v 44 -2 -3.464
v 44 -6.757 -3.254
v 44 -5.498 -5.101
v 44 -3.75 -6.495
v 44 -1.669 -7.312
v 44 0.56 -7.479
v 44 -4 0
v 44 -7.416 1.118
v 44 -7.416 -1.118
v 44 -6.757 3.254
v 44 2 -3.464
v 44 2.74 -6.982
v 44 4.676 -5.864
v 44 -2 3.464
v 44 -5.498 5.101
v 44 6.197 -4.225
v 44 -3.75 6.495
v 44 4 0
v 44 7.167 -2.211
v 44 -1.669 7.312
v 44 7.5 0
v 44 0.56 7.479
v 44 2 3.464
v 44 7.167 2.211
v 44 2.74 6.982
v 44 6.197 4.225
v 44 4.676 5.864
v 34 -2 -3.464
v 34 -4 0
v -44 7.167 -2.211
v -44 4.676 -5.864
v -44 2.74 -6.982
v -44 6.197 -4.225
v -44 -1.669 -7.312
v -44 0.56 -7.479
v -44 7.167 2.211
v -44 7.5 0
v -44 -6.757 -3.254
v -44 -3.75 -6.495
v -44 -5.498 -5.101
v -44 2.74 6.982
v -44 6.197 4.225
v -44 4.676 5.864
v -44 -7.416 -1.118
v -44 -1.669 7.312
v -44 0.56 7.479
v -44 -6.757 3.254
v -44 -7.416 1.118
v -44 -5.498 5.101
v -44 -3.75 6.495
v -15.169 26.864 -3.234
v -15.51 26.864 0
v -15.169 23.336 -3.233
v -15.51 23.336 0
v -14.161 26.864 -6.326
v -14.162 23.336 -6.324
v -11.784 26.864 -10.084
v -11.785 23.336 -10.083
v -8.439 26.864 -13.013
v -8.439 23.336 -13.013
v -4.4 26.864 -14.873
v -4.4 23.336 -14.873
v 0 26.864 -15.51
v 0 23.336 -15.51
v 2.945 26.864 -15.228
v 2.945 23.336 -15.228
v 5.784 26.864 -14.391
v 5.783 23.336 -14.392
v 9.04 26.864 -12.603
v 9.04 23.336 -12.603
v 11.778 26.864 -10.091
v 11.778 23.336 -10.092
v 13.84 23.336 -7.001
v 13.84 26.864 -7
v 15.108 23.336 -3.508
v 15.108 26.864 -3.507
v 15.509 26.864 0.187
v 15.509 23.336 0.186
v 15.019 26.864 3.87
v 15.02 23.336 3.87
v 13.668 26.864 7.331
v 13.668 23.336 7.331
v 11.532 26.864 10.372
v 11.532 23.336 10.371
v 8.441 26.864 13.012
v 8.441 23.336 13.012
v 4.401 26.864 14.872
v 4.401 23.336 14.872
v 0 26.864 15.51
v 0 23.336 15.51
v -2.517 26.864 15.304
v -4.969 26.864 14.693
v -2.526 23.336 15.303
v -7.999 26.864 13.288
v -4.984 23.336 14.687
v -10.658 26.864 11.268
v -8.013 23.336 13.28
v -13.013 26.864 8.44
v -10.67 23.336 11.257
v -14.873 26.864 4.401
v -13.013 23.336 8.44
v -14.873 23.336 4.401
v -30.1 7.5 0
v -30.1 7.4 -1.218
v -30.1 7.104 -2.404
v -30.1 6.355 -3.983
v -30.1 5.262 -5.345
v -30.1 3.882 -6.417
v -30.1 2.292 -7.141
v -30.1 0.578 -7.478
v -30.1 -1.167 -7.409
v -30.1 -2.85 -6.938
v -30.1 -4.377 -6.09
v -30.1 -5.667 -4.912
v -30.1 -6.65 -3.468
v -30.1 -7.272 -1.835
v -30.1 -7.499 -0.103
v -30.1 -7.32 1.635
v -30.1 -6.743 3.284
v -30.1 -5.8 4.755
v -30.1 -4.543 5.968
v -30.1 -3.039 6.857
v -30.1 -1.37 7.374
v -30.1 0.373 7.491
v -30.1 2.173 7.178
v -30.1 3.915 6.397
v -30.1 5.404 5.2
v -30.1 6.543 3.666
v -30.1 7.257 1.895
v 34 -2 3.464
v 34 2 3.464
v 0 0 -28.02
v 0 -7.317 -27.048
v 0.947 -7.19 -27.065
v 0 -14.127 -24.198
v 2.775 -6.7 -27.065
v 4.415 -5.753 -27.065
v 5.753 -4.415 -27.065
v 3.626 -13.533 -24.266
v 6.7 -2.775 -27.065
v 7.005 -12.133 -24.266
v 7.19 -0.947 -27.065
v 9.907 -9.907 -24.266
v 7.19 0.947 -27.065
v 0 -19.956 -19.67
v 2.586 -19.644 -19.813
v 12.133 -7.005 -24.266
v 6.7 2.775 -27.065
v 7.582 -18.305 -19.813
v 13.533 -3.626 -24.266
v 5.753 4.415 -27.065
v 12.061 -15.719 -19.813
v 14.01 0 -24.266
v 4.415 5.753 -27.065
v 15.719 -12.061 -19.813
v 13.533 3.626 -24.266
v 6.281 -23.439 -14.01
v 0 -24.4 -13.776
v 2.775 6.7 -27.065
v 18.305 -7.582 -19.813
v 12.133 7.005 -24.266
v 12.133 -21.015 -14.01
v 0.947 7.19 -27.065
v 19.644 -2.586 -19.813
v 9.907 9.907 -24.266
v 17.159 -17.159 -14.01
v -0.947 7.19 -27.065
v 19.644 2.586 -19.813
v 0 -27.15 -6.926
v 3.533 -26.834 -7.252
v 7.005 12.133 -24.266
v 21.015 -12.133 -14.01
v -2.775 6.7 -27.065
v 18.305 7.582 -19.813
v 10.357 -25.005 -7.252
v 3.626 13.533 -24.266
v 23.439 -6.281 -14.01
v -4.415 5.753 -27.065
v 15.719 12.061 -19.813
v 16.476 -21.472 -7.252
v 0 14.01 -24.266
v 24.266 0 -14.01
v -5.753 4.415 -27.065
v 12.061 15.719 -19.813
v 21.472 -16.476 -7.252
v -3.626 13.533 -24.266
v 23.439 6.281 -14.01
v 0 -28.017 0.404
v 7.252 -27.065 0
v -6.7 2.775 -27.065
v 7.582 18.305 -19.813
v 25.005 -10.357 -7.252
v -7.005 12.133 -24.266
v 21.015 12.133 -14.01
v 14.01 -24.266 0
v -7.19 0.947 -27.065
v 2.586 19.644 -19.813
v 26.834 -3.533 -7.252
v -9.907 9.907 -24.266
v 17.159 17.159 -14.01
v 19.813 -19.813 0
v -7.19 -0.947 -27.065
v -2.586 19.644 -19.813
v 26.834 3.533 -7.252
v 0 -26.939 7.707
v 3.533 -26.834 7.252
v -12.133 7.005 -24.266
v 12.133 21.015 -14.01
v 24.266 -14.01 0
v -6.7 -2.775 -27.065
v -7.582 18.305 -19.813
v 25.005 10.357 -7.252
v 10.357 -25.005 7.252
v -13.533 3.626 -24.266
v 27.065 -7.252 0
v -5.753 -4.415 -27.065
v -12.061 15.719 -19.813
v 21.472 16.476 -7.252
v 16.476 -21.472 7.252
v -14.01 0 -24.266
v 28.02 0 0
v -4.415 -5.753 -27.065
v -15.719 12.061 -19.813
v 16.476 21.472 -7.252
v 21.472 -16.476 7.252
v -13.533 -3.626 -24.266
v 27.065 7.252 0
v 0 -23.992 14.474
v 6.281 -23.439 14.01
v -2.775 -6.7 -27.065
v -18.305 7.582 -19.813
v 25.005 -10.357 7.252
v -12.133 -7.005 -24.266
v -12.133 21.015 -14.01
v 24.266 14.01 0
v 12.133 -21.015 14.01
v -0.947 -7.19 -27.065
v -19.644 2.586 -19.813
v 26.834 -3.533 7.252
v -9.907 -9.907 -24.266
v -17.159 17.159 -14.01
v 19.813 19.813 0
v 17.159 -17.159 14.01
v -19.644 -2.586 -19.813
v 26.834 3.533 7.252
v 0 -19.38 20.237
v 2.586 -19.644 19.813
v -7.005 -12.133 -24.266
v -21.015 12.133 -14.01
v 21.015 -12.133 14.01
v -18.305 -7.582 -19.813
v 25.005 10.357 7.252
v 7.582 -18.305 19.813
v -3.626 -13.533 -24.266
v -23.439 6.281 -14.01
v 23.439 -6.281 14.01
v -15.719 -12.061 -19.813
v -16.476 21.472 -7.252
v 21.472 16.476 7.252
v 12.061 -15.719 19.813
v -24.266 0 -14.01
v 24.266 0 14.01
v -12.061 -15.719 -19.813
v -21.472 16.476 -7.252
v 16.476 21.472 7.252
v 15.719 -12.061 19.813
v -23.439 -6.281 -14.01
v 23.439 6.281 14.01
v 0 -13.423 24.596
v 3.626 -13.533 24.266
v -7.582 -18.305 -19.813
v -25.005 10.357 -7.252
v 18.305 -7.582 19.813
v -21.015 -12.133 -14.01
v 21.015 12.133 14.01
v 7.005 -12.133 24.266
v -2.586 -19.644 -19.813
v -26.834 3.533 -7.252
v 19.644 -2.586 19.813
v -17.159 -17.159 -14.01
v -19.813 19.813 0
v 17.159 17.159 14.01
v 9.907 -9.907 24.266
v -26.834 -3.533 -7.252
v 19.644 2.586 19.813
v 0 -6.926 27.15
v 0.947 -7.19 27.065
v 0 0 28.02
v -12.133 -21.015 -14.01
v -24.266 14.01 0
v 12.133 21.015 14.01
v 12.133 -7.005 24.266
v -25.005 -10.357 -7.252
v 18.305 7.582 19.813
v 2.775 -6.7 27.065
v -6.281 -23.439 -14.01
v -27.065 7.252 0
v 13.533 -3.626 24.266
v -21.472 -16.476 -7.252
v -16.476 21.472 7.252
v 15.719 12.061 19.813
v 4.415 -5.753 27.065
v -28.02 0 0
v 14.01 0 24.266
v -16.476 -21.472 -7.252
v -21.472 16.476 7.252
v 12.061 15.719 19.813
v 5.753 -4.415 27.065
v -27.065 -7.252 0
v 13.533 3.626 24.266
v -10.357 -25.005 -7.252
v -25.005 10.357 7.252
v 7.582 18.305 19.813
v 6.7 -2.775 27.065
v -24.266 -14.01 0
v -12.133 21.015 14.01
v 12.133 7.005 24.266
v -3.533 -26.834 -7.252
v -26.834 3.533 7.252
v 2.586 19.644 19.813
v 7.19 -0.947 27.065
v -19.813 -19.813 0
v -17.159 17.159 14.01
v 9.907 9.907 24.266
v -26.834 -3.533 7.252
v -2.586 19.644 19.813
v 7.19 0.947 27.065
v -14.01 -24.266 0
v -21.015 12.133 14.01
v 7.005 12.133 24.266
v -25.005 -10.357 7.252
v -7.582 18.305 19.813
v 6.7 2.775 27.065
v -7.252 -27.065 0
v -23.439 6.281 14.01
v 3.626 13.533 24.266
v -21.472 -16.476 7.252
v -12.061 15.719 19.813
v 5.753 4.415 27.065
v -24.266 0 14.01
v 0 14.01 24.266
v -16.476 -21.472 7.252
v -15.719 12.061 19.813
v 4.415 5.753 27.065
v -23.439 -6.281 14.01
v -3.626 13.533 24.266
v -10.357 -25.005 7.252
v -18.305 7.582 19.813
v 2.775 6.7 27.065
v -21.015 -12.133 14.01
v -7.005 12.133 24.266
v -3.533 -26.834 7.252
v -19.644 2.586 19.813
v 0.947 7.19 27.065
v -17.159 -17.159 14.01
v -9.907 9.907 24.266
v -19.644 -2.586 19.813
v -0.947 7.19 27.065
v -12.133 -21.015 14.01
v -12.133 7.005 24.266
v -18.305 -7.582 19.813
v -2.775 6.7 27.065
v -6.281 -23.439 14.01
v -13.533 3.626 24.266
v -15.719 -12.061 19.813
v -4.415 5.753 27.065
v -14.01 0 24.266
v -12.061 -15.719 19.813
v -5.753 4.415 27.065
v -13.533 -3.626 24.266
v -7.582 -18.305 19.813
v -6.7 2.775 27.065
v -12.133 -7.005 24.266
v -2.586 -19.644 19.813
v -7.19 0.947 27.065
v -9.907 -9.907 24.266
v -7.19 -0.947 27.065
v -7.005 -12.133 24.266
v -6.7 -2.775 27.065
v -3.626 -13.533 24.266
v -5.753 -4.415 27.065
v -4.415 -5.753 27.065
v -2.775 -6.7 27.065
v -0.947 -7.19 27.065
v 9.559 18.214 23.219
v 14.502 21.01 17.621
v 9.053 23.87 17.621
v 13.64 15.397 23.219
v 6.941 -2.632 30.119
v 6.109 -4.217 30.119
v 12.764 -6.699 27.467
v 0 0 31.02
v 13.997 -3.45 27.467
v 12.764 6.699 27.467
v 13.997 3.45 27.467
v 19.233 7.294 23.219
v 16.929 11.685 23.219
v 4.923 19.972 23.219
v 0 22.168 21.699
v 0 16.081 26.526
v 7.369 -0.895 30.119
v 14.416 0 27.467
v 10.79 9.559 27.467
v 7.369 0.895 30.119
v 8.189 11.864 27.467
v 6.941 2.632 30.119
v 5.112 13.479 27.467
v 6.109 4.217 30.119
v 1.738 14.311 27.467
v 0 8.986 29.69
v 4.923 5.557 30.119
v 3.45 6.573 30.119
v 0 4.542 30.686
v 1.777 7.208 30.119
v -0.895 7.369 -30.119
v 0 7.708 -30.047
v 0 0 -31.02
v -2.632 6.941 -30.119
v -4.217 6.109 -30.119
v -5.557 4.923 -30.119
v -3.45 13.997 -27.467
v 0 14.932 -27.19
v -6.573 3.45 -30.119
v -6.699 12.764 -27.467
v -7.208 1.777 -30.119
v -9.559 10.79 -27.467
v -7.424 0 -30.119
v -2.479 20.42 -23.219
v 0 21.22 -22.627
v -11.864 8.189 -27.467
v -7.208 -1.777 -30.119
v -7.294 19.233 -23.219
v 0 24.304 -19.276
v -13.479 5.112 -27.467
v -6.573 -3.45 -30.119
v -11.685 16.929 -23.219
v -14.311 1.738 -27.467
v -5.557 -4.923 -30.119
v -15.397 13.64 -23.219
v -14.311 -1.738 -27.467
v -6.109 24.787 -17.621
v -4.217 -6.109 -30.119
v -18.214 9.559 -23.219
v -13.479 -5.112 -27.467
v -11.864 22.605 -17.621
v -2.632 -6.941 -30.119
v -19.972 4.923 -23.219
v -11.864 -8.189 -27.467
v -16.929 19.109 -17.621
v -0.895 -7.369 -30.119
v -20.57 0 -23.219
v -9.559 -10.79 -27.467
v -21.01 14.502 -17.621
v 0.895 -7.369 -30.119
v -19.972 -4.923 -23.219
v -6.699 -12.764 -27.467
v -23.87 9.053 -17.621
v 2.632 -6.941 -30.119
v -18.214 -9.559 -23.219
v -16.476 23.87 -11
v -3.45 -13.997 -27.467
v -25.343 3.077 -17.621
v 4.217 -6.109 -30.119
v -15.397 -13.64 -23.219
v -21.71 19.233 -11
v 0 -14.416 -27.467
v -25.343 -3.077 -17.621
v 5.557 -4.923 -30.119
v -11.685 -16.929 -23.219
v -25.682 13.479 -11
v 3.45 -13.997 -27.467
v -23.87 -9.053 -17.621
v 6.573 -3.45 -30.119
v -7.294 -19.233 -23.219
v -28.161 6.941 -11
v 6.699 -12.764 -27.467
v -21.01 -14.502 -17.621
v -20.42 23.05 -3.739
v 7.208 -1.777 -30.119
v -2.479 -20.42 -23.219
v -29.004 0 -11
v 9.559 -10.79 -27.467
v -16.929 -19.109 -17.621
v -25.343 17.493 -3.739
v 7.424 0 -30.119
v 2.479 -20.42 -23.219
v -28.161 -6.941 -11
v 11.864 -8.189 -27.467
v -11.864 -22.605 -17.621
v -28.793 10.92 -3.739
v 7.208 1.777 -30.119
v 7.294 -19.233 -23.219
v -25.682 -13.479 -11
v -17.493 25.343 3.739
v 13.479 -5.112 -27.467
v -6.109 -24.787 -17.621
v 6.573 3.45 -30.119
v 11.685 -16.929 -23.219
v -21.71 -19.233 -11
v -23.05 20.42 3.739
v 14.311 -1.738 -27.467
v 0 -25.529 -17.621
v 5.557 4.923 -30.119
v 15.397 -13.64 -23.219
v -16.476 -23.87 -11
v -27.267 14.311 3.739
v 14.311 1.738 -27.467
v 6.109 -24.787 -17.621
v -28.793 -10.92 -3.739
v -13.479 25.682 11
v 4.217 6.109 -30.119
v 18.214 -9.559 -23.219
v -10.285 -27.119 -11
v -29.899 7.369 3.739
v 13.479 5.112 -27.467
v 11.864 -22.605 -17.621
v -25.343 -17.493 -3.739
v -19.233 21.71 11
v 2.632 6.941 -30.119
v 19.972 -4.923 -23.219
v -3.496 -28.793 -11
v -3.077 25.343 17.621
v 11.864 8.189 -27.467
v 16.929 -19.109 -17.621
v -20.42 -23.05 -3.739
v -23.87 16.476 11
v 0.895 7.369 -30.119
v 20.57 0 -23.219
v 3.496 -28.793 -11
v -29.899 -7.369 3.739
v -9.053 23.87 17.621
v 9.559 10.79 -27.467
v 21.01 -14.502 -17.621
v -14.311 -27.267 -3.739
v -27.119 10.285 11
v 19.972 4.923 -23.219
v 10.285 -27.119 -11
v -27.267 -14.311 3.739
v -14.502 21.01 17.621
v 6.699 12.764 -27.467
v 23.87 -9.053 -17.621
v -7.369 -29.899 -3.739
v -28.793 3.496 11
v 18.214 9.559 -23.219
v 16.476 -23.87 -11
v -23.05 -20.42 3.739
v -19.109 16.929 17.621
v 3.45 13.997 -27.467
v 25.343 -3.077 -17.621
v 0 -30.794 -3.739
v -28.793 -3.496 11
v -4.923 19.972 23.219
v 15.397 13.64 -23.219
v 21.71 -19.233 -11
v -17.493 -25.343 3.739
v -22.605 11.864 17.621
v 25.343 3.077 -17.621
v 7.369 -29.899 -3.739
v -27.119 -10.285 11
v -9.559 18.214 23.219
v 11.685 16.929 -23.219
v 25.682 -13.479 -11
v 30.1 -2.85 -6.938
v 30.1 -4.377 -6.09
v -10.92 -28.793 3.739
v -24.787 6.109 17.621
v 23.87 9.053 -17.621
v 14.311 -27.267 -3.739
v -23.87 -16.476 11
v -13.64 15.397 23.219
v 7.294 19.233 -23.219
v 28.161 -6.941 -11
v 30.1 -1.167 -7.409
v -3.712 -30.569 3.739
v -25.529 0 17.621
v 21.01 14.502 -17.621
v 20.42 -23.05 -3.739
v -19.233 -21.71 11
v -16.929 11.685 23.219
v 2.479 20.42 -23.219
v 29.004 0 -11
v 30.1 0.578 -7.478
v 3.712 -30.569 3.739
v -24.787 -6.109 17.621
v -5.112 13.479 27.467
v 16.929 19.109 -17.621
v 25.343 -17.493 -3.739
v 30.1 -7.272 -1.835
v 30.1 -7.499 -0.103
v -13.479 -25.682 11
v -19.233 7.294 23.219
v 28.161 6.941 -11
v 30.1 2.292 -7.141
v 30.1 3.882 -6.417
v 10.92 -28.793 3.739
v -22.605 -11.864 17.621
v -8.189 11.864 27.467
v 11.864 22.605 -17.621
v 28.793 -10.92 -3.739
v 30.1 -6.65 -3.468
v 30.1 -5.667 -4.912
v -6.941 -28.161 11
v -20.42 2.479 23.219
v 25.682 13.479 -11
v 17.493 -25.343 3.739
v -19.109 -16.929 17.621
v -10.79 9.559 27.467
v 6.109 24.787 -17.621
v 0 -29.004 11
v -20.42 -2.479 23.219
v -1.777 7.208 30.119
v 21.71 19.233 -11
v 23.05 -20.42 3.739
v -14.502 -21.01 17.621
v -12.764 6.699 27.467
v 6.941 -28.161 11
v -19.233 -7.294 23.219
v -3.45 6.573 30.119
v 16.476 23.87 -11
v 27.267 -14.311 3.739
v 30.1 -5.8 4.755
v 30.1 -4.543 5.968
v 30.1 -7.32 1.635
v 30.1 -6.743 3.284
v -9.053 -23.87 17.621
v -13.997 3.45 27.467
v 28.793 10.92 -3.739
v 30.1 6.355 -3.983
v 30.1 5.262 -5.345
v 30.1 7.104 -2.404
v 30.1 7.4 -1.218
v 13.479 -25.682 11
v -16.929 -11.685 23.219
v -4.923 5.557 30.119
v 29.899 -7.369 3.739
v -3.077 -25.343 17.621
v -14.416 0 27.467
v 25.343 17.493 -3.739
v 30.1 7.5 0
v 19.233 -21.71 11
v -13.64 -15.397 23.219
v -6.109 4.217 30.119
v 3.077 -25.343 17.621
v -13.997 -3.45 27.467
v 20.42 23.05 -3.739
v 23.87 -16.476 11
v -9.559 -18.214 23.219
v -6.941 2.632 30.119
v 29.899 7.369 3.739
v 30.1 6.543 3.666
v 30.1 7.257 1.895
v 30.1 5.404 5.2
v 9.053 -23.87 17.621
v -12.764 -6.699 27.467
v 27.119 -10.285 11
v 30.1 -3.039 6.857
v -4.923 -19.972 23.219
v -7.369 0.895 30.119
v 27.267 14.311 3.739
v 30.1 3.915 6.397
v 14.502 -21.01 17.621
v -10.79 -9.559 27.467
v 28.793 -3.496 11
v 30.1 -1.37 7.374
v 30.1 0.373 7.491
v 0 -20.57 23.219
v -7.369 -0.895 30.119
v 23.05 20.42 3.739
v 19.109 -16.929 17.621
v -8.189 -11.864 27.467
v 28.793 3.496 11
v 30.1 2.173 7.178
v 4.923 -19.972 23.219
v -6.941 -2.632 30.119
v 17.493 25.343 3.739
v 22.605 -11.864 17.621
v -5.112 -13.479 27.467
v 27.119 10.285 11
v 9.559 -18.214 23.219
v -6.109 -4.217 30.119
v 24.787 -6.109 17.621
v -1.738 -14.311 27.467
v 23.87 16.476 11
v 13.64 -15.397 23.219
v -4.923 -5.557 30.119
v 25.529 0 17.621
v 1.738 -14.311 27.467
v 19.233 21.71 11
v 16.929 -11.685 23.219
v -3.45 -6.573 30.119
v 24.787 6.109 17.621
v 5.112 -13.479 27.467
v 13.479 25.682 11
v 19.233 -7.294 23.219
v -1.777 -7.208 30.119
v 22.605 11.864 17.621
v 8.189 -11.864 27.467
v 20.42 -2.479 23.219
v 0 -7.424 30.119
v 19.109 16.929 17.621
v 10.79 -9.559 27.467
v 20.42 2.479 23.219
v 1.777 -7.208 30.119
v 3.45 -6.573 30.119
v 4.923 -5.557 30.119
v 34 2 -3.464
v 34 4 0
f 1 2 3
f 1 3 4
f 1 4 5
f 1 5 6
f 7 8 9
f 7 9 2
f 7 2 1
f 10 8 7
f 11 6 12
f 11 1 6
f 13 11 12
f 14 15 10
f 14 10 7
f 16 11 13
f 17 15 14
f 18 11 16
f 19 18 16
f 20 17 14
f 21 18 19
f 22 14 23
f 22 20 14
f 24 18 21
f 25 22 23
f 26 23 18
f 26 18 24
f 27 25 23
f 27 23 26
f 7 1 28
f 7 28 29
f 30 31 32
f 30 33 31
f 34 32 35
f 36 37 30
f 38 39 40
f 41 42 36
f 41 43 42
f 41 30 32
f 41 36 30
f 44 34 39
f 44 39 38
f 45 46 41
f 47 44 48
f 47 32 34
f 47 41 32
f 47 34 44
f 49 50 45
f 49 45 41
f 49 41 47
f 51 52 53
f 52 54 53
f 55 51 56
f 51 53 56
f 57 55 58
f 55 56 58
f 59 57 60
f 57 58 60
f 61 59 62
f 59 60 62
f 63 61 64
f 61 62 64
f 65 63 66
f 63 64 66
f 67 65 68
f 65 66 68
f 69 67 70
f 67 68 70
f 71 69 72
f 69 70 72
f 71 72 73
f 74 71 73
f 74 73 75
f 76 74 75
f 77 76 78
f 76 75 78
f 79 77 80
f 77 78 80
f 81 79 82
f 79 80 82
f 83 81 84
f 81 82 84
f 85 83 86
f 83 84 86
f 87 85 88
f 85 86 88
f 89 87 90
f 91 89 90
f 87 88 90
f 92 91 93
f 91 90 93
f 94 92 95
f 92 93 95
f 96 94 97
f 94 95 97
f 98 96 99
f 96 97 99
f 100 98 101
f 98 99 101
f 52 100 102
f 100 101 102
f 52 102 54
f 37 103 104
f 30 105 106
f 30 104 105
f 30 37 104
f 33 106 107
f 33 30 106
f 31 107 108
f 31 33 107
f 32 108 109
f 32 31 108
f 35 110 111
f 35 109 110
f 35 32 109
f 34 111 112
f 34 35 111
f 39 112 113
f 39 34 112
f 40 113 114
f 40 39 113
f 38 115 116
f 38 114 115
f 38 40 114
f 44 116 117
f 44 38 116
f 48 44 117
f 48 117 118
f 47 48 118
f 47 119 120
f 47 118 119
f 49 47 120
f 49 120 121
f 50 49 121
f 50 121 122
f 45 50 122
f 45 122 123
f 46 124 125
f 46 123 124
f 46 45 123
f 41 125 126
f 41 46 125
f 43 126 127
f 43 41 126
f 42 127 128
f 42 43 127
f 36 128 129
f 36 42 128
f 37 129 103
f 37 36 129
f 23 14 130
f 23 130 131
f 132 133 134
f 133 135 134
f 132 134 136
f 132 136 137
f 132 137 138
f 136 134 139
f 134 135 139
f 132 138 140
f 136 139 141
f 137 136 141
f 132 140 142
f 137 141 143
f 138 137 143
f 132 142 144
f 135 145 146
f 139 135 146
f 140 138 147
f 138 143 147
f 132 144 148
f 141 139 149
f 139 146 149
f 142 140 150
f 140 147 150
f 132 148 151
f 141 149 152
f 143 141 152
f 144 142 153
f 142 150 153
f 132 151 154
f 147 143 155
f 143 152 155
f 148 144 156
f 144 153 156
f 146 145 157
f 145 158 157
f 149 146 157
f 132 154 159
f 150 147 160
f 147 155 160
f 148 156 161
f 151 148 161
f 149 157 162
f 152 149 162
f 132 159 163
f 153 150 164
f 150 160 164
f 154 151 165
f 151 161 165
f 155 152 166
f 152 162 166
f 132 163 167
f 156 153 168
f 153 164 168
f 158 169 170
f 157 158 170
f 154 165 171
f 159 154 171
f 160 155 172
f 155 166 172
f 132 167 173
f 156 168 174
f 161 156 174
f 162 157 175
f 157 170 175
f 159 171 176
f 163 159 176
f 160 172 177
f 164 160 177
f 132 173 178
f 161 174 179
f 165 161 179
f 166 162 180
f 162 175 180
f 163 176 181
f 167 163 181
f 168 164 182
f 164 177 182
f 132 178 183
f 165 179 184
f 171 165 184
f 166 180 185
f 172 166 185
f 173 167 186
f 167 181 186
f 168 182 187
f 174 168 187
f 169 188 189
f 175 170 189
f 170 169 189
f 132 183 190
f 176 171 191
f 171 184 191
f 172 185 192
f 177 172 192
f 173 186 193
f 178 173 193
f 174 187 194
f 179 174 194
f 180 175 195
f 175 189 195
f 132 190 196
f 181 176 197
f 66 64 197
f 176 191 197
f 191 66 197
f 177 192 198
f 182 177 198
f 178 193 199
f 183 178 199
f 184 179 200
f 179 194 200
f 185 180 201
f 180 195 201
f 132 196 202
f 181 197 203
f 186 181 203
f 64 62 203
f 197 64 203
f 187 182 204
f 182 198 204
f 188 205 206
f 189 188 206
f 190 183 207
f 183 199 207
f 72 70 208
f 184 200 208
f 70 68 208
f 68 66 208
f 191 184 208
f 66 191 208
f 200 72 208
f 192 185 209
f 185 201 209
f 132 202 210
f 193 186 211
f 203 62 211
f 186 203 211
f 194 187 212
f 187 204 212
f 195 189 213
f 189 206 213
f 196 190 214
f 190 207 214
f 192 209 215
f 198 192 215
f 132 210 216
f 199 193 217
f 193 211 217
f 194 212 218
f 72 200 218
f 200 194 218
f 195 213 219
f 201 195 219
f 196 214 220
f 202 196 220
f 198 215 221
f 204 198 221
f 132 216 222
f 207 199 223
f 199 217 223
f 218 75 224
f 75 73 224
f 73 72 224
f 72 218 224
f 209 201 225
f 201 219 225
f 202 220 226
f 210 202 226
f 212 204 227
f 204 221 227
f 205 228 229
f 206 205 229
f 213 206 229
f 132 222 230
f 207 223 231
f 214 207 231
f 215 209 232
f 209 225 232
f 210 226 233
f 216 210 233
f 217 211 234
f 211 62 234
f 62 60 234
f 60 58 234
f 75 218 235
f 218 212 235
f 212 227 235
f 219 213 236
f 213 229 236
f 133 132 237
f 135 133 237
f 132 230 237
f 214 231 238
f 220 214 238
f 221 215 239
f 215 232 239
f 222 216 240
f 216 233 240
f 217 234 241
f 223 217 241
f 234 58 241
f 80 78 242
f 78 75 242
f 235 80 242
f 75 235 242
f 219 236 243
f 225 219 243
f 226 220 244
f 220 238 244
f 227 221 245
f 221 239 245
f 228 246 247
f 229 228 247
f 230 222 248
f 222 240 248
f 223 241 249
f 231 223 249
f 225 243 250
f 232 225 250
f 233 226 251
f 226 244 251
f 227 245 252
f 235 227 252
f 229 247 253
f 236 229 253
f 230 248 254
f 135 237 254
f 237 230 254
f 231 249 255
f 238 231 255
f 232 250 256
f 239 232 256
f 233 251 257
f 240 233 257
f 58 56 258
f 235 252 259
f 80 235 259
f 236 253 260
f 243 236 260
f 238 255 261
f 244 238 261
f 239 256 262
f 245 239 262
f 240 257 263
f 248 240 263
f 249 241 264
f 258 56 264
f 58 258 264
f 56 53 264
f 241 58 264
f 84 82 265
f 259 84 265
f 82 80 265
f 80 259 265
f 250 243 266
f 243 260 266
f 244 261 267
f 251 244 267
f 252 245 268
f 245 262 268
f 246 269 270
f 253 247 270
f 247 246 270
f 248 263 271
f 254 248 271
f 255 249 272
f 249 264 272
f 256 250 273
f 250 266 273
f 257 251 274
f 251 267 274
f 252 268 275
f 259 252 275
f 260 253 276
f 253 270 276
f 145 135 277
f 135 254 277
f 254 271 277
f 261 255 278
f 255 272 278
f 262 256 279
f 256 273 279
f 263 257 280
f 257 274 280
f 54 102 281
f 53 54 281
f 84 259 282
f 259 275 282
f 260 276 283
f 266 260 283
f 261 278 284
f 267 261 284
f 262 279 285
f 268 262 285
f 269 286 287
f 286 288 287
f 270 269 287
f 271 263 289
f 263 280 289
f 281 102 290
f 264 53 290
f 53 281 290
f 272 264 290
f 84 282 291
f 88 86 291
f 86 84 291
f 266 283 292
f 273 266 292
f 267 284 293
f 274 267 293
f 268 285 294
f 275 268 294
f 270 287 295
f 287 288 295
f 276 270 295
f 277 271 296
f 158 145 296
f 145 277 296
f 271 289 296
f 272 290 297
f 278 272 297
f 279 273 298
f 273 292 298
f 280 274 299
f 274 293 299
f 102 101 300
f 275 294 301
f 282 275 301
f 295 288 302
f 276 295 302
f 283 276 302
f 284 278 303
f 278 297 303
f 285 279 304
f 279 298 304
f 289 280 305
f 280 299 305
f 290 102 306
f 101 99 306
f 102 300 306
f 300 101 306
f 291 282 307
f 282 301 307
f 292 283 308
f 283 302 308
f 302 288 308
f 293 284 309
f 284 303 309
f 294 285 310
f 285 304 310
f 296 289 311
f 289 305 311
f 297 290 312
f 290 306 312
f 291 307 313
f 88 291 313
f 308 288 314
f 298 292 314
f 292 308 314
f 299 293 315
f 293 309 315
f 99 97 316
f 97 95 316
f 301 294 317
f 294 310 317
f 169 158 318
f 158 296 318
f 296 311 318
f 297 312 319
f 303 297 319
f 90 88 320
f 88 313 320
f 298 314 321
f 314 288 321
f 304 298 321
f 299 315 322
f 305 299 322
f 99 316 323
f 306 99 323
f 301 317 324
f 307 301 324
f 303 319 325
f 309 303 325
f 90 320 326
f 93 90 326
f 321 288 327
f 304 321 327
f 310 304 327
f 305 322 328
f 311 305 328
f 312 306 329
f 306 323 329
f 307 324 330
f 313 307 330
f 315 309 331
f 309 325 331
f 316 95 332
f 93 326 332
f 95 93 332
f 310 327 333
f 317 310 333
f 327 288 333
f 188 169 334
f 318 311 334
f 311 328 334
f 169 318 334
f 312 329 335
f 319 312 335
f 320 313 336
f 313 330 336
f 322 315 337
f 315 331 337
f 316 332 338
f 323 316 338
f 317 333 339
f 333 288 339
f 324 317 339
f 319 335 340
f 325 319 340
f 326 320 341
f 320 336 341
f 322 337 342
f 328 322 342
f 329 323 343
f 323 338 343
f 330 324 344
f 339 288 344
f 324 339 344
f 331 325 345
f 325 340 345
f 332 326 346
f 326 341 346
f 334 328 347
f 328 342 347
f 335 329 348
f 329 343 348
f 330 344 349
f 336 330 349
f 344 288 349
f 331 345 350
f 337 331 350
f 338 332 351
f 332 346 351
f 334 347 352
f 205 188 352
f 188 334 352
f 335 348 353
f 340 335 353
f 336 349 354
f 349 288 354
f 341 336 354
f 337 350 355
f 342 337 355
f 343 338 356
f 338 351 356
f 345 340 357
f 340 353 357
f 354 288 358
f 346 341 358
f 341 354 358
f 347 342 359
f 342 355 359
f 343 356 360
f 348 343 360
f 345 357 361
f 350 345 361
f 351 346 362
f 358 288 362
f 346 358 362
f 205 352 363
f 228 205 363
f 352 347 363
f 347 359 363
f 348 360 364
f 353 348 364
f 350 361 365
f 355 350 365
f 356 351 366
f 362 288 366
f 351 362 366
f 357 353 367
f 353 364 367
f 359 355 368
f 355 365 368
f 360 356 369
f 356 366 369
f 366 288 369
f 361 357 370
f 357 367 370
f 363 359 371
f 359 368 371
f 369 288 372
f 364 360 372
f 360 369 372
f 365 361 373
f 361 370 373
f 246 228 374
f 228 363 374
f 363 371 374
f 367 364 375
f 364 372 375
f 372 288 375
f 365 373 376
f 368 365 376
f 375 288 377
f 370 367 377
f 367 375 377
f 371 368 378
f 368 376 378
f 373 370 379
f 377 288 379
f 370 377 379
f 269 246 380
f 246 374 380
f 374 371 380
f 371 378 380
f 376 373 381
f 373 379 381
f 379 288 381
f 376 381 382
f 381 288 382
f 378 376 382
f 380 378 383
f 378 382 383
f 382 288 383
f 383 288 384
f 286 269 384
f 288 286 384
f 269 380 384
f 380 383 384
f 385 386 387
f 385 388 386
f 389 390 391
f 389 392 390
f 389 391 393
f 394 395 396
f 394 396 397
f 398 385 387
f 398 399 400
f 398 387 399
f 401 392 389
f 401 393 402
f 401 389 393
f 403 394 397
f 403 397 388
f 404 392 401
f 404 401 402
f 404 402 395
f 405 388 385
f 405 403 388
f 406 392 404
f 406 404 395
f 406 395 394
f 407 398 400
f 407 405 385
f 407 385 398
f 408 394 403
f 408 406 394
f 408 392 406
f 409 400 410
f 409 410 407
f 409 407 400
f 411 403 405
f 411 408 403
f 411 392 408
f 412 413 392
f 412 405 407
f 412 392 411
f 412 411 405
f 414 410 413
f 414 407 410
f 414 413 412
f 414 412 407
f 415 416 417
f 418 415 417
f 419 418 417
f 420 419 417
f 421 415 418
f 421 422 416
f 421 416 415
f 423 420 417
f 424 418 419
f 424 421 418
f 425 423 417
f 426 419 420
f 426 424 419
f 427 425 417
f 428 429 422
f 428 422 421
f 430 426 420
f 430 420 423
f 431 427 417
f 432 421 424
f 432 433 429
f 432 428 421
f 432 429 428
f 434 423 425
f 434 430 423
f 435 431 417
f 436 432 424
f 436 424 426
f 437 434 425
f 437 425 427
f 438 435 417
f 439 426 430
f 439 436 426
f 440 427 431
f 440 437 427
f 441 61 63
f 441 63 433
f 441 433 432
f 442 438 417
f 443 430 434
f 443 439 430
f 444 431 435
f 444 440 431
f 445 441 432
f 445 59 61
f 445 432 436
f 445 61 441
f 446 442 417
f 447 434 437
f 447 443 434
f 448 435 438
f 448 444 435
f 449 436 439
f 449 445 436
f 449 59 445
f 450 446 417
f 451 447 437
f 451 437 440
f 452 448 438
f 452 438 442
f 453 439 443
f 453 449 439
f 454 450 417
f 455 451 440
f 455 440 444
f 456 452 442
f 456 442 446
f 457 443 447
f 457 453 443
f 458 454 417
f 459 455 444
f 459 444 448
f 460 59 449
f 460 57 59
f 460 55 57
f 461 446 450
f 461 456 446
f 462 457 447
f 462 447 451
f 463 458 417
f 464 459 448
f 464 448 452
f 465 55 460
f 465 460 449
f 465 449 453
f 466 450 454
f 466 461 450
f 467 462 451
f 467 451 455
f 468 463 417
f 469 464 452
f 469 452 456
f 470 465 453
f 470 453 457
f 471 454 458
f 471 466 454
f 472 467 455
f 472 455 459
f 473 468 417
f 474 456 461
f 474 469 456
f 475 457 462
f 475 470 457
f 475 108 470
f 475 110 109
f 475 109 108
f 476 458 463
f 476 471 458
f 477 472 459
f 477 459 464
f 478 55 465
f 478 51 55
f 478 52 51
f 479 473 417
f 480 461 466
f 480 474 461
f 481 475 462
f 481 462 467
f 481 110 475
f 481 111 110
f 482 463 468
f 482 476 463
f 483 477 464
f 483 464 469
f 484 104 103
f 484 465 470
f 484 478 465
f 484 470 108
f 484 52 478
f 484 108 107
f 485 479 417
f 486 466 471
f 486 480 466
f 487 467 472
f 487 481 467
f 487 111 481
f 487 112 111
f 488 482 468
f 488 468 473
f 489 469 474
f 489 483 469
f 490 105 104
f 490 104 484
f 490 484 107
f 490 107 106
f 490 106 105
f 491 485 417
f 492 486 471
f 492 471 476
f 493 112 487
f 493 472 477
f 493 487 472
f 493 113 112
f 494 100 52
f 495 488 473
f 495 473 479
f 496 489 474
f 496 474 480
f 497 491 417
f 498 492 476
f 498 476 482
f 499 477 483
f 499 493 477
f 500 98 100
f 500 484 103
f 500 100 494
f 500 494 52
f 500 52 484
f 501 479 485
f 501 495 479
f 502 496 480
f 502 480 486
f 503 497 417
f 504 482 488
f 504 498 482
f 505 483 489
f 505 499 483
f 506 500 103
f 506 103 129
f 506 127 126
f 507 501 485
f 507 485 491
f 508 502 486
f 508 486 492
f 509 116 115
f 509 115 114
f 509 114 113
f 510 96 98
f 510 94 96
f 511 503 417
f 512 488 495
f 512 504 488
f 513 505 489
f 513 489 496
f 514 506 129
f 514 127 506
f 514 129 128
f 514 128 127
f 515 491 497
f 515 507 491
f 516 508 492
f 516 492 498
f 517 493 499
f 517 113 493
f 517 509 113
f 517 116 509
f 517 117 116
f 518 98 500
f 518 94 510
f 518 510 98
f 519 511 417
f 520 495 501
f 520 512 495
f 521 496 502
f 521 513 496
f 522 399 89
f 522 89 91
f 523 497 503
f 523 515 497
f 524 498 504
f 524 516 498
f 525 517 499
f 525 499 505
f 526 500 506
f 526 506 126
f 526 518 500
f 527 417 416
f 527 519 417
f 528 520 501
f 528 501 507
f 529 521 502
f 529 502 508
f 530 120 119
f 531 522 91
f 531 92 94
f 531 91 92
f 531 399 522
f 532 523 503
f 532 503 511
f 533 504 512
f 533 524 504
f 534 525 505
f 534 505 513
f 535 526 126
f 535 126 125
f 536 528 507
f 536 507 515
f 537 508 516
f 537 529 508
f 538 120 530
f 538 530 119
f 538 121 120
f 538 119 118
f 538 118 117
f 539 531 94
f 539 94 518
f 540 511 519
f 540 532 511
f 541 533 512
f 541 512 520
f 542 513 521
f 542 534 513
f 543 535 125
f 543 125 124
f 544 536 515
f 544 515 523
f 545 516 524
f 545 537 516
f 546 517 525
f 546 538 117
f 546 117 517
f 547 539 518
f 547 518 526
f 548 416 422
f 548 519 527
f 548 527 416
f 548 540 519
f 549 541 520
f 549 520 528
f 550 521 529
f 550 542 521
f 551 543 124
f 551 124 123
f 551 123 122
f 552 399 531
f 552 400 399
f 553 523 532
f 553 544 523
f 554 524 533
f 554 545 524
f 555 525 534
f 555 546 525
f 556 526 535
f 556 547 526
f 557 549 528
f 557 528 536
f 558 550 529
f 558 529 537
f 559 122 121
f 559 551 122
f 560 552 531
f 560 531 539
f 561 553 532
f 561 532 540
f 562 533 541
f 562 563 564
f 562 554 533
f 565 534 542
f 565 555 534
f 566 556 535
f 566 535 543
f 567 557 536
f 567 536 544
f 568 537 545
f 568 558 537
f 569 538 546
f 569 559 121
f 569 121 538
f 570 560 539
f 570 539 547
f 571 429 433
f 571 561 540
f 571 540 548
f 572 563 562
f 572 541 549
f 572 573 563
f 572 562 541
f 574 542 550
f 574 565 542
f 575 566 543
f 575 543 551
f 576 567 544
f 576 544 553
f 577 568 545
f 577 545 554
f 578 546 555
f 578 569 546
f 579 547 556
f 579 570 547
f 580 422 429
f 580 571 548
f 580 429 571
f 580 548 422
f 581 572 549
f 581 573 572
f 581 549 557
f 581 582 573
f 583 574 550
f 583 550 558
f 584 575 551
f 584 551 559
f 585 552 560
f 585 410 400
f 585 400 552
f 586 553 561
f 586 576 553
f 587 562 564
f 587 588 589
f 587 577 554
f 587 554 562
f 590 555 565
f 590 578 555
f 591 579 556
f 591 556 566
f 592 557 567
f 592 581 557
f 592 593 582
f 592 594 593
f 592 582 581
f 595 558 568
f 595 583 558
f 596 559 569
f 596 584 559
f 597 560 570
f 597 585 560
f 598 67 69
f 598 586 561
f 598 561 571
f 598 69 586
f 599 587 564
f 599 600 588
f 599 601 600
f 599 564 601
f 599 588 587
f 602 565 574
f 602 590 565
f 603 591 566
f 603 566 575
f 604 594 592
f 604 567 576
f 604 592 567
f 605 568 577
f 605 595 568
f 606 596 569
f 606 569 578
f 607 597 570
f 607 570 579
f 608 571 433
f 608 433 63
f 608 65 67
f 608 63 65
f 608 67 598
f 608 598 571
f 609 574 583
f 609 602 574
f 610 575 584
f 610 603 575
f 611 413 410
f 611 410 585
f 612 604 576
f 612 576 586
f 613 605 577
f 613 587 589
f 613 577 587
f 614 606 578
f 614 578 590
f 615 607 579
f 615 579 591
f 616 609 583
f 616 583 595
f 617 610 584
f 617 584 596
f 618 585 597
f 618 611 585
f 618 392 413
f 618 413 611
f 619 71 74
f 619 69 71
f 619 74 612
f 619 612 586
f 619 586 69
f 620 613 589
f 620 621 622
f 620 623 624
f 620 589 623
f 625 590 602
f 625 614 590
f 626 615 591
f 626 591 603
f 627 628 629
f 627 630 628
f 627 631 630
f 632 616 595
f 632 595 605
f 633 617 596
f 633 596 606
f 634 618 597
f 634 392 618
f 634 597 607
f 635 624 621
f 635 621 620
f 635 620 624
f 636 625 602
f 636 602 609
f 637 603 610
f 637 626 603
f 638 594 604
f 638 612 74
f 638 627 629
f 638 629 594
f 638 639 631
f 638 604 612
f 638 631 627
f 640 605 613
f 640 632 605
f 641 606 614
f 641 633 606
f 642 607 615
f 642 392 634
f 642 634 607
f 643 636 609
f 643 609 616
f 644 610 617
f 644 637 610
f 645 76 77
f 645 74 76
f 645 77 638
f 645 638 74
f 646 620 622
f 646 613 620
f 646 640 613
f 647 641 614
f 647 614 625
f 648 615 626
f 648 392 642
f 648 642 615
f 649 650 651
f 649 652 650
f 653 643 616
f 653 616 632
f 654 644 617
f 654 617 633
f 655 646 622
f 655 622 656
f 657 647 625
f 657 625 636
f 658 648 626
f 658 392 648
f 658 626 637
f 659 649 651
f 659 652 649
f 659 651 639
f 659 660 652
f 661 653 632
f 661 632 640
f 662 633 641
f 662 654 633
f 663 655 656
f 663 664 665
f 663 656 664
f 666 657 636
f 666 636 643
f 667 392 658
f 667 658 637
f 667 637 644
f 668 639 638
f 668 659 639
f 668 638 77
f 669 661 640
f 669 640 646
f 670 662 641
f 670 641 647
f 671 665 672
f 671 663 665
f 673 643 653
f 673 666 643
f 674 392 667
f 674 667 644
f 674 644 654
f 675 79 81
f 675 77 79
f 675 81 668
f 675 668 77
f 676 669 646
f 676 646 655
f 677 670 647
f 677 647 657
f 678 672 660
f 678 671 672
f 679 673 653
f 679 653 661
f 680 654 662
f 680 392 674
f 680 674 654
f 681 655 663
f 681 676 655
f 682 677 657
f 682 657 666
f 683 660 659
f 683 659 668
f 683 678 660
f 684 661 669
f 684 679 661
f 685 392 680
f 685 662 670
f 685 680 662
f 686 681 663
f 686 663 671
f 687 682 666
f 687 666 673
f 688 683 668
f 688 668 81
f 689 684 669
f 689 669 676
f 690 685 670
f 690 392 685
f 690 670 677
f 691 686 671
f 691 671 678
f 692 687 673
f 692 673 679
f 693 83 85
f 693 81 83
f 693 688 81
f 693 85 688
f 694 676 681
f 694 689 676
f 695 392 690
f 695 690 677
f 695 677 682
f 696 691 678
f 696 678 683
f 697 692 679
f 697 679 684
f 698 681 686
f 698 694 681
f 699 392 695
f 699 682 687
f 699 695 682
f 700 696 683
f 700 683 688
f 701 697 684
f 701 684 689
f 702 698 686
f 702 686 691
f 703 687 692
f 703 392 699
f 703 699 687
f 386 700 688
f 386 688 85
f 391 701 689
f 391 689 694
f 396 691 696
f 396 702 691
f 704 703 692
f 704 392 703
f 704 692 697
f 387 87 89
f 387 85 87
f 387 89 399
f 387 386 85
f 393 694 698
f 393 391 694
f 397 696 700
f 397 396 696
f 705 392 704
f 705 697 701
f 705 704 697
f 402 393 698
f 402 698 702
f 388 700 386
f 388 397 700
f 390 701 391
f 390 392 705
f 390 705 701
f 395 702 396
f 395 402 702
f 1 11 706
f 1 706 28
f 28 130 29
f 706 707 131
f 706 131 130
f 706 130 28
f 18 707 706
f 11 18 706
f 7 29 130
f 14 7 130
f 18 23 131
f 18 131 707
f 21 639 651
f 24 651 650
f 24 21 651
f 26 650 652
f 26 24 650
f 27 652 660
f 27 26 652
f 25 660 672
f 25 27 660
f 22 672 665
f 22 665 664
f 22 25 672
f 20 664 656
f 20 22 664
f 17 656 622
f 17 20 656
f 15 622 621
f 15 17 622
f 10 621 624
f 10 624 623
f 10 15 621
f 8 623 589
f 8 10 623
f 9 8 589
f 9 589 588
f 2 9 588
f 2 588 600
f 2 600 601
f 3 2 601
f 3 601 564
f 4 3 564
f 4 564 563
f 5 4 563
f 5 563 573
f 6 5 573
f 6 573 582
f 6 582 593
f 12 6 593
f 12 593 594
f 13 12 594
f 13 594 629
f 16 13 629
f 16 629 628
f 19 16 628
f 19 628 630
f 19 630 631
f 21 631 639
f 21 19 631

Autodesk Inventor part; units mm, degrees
ref_plane "XZ Plane" through (0, 0, 0) normal (0, 1, 0) x (-1, 0, 0)
ref_plane "XY Plane" through (0, 0, 0) normal (0, 0, 1) x (1, 0, 0)
sketch "Sketch8" plane through (0, 0, 0) normal (1, 0, 0) x (0, 1, 0)
  arc A0 (0, -31.02) -> (0, 31.02) centre (0, 0) ccw
  line L0 (0, 31.02) -> (0, -31.02)
  line L1 (0, -49.5025) -> (0, 42.4391) construction
  dimension "radio" = 31.02
revolve "Revolution2" add sketch "Sketch8" angle 360 about axis through (0, 0, -49.5025) along (0, 0, 1)
sketch "Sketch15" plane through (0, 0, 0) normal (0, 1, 0) x (-1, 0, 0)
  circle A0 centre (0, 0) radius 15.51
  dimension "d35" = 31.02
extrude "Extrusion9" cut sketch "Sketch15" along normal up to surface
shell "Shell5" thickness 3 removed faces 2 at (0, 8.9547, 15.51) at (-6.3263, 0, 3.7266)
ref_plane "Work Plane6" through (44, 0, 0) normal (1, 0, 0) x (0, 1, 0)
sketch "Sketch13" plane through (44, 0, 0) normal (1, 0, 0) x (0, 1, 0)
  circle A0 centre (0, 0) radius 7.5
  dimension "d32" = 15
extrude "Extrusion8" add sketch "Sketch13" against normal up to next
mirror "Mirror1" about plane through (0, 0, 0) normal (1, 0, 0) of "Extrusion8"
sketch "Sketch16" plane through (44, 0, 0) normal (1, 0, 0) x (0, 0, -1)
  circle A0 centre (0, 0) radius 7.5 projected
  circle A1 centre (0, 0) radius 4 construction
  line L0 (0, 4) -> (3.4641, 2)
  line L1 (3.4641, 2) -> (3.4641, -2)
  line L2 (3.4641, -2) -> (0, -4)
  line L3 (0, -4) -> (-3.4641, -2)
  line L4 (-3.4641, -2) -> (-3.4641, 2)
  line L5 (-3.4641, 2) -> (0, 4)
  dimension "d40" = 3.5
extrude "Extrusion10" cut sketch "Sketch16" against normal blind 10 contours L0 L1 L2 L3 L4 L5
equation "\"d35\" = radio"
properties part number "Dosificador" material "ABS Plastic"
